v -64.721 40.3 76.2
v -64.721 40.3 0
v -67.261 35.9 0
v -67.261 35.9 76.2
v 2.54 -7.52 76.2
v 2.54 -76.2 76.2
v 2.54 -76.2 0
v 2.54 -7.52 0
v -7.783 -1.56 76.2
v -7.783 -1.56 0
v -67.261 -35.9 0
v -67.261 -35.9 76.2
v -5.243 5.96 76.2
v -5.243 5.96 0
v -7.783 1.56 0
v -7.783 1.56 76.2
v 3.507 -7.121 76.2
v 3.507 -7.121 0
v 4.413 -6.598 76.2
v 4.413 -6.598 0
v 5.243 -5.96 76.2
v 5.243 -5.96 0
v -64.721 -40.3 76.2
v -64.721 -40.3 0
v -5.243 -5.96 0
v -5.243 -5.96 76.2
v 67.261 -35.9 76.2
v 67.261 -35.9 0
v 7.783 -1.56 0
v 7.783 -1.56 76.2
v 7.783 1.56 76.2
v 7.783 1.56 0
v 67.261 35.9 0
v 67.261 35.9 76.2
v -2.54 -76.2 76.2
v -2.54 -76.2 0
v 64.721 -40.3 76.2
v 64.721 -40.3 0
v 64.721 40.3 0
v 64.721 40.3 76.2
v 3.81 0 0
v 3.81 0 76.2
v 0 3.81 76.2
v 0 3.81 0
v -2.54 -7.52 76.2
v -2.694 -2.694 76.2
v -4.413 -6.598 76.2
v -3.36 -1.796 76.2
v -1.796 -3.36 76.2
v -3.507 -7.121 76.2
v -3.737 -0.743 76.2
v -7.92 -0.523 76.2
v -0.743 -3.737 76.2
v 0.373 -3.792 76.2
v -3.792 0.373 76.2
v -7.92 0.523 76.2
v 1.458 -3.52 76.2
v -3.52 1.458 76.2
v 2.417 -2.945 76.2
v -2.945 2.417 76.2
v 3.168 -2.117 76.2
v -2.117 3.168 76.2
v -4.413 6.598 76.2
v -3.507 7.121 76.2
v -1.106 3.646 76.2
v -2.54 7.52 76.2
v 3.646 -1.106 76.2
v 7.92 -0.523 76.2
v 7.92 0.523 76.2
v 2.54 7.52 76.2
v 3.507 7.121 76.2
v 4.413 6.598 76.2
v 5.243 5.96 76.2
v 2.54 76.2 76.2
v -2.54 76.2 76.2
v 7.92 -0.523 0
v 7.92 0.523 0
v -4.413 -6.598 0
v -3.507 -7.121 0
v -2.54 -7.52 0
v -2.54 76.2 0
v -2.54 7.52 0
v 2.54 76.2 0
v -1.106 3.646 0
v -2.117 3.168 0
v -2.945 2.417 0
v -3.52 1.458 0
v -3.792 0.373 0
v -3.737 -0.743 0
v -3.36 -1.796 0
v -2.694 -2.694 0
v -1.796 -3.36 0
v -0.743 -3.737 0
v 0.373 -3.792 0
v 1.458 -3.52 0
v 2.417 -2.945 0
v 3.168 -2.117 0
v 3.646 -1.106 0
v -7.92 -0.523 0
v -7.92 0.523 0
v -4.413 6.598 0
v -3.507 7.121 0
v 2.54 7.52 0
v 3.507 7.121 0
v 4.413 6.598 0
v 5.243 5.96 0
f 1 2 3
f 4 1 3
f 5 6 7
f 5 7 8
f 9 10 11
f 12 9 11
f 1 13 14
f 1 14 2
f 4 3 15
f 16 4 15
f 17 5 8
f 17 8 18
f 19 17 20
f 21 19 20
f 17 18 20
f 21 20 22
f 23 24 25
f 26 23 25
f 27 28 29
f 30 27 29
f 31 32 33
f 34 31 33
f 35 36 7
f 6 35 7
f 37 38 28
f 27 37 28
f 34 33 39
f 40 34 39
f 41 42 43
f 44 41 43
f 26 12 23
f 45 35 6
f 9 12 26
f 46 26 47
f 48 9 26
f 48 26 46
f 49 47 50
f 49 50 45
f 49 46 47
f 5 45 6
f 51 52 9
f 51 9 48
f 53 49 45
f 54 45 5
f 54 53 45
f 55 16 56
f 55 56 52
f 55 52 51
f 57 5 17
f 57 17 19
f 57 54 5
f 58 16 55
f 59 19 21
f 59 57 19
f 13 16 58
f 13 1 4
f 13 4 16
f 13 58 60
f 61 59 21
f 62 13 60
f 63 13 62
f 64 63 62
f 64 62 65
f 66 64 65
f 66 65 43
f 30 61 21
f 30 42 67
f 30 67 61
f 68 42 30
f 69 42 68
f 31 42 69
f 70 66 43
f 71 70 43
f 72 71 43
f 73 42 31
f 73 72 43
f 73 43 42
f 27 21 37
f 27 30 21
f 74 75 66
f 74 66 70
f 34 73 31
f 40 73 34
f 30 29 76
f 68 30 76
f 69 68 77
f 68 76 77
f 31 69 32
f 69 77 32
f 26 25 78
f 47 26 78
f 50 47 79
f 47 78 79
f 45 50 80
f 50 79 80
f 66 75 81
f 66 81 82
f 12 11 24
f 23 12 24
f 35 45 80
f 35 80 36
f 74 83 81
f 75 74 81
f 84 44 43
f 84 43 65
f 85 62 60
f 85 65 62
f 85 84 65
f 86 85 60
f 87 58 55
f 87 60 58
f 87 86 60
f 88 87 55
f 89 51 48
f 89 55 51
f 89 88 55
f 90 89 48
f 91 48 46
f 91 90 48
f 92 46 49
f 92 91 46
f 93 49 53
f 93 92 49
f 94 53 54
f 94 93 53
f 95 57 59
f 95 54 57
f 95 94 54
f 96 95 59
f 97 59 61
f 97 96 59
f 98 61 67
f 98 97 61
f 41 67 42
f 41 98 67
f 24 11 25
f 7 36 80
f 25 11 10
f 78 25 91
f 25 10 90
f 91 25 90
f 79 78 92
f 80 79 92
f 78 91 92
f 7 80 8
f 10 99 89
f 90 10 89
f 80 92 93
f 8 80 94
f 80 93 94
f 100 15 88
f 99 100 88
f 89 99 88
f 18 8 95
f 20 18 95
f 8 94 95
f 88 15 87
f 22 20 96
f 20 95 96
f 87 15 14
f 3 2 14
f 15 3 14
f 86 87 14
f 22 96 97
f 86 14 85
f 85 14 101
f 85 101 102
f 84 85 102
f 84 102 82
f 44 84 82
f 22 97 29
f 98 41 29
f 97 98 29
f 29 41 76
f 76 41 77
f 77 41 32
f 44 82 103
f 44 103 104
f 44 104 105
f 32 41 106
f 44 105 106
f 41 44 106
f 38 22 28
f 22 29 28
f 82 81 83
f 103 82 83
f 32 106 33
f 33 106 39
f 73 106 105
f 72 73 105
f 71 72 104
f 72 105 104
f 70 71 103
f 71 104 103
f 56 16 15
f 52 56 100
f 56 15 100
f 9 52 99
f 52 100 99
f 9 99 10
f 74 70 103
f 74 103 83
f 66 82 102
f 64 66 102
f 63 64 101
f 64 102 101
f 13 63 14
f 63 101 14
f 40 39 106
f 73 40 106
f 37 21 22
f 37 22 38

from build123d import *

# Parameters (mm, degrees)
SKETCH1_R               = 7.9375
BOSS_EXTRUDE1_DEPTH     = 76.2
CUT_EXTRUDE1_DEPTH      = 128.031257511
CUT_EXTRUDE1_DEPTH_BACK = 128.031257511


with BuildPart() as part:
    # Sketch1 → Boss-Extrude1 (new body)
    with BuildSketch(Plane.XY):
        Circle(SKETCH1_R)
        Polygon((2.54, 0), (2.54, 76.2), (-2.54, 76.2), (-2.54, 0), (-2.54, -76.2), (2.54, -76.2), align=None)
        Polygon((1.27, -2.199704526), (67.261135768, 35.900295474), (64.721135768, 40.299704526), (-1.27, 2.199704526), (-67.261135768, -35.900295474), (-64.721135768, -40.299704526), align=None)
        Polygon((-1.27, -2.199704526), (64.721135768, -40.299704526), (67.261135768, -35.900295474), (1.27, 2.199704526), (-64.721135768, 40.299704526), (-67.261135768, 35.900295474), align=None)
    extrude(amount=BOSS_EXTRUDE1_DEPTH)

    # Sketch2 → Cut-Extrude1 (cut, two sides: drawn at the far end of the back side and taken through both)
    with BuildSketch(Plane.XY.offset(76.2).offset(-CUT_EXTRUDE1_DEPTH_BACK)):
        with BuildLine():
            Line((3.81, 0), (0, 3.81))
            ThreePointArc((0, 3.81), (-2.694076836, -2.694076836), (3.81, 0))
        make_face()
    extrude(amount=CUT_EXTRUDE1_DEPTH + CUT_EXTRUDE1_DEPTH_BACK, mode=Mode.SUBTRACT)


solid = part.part
